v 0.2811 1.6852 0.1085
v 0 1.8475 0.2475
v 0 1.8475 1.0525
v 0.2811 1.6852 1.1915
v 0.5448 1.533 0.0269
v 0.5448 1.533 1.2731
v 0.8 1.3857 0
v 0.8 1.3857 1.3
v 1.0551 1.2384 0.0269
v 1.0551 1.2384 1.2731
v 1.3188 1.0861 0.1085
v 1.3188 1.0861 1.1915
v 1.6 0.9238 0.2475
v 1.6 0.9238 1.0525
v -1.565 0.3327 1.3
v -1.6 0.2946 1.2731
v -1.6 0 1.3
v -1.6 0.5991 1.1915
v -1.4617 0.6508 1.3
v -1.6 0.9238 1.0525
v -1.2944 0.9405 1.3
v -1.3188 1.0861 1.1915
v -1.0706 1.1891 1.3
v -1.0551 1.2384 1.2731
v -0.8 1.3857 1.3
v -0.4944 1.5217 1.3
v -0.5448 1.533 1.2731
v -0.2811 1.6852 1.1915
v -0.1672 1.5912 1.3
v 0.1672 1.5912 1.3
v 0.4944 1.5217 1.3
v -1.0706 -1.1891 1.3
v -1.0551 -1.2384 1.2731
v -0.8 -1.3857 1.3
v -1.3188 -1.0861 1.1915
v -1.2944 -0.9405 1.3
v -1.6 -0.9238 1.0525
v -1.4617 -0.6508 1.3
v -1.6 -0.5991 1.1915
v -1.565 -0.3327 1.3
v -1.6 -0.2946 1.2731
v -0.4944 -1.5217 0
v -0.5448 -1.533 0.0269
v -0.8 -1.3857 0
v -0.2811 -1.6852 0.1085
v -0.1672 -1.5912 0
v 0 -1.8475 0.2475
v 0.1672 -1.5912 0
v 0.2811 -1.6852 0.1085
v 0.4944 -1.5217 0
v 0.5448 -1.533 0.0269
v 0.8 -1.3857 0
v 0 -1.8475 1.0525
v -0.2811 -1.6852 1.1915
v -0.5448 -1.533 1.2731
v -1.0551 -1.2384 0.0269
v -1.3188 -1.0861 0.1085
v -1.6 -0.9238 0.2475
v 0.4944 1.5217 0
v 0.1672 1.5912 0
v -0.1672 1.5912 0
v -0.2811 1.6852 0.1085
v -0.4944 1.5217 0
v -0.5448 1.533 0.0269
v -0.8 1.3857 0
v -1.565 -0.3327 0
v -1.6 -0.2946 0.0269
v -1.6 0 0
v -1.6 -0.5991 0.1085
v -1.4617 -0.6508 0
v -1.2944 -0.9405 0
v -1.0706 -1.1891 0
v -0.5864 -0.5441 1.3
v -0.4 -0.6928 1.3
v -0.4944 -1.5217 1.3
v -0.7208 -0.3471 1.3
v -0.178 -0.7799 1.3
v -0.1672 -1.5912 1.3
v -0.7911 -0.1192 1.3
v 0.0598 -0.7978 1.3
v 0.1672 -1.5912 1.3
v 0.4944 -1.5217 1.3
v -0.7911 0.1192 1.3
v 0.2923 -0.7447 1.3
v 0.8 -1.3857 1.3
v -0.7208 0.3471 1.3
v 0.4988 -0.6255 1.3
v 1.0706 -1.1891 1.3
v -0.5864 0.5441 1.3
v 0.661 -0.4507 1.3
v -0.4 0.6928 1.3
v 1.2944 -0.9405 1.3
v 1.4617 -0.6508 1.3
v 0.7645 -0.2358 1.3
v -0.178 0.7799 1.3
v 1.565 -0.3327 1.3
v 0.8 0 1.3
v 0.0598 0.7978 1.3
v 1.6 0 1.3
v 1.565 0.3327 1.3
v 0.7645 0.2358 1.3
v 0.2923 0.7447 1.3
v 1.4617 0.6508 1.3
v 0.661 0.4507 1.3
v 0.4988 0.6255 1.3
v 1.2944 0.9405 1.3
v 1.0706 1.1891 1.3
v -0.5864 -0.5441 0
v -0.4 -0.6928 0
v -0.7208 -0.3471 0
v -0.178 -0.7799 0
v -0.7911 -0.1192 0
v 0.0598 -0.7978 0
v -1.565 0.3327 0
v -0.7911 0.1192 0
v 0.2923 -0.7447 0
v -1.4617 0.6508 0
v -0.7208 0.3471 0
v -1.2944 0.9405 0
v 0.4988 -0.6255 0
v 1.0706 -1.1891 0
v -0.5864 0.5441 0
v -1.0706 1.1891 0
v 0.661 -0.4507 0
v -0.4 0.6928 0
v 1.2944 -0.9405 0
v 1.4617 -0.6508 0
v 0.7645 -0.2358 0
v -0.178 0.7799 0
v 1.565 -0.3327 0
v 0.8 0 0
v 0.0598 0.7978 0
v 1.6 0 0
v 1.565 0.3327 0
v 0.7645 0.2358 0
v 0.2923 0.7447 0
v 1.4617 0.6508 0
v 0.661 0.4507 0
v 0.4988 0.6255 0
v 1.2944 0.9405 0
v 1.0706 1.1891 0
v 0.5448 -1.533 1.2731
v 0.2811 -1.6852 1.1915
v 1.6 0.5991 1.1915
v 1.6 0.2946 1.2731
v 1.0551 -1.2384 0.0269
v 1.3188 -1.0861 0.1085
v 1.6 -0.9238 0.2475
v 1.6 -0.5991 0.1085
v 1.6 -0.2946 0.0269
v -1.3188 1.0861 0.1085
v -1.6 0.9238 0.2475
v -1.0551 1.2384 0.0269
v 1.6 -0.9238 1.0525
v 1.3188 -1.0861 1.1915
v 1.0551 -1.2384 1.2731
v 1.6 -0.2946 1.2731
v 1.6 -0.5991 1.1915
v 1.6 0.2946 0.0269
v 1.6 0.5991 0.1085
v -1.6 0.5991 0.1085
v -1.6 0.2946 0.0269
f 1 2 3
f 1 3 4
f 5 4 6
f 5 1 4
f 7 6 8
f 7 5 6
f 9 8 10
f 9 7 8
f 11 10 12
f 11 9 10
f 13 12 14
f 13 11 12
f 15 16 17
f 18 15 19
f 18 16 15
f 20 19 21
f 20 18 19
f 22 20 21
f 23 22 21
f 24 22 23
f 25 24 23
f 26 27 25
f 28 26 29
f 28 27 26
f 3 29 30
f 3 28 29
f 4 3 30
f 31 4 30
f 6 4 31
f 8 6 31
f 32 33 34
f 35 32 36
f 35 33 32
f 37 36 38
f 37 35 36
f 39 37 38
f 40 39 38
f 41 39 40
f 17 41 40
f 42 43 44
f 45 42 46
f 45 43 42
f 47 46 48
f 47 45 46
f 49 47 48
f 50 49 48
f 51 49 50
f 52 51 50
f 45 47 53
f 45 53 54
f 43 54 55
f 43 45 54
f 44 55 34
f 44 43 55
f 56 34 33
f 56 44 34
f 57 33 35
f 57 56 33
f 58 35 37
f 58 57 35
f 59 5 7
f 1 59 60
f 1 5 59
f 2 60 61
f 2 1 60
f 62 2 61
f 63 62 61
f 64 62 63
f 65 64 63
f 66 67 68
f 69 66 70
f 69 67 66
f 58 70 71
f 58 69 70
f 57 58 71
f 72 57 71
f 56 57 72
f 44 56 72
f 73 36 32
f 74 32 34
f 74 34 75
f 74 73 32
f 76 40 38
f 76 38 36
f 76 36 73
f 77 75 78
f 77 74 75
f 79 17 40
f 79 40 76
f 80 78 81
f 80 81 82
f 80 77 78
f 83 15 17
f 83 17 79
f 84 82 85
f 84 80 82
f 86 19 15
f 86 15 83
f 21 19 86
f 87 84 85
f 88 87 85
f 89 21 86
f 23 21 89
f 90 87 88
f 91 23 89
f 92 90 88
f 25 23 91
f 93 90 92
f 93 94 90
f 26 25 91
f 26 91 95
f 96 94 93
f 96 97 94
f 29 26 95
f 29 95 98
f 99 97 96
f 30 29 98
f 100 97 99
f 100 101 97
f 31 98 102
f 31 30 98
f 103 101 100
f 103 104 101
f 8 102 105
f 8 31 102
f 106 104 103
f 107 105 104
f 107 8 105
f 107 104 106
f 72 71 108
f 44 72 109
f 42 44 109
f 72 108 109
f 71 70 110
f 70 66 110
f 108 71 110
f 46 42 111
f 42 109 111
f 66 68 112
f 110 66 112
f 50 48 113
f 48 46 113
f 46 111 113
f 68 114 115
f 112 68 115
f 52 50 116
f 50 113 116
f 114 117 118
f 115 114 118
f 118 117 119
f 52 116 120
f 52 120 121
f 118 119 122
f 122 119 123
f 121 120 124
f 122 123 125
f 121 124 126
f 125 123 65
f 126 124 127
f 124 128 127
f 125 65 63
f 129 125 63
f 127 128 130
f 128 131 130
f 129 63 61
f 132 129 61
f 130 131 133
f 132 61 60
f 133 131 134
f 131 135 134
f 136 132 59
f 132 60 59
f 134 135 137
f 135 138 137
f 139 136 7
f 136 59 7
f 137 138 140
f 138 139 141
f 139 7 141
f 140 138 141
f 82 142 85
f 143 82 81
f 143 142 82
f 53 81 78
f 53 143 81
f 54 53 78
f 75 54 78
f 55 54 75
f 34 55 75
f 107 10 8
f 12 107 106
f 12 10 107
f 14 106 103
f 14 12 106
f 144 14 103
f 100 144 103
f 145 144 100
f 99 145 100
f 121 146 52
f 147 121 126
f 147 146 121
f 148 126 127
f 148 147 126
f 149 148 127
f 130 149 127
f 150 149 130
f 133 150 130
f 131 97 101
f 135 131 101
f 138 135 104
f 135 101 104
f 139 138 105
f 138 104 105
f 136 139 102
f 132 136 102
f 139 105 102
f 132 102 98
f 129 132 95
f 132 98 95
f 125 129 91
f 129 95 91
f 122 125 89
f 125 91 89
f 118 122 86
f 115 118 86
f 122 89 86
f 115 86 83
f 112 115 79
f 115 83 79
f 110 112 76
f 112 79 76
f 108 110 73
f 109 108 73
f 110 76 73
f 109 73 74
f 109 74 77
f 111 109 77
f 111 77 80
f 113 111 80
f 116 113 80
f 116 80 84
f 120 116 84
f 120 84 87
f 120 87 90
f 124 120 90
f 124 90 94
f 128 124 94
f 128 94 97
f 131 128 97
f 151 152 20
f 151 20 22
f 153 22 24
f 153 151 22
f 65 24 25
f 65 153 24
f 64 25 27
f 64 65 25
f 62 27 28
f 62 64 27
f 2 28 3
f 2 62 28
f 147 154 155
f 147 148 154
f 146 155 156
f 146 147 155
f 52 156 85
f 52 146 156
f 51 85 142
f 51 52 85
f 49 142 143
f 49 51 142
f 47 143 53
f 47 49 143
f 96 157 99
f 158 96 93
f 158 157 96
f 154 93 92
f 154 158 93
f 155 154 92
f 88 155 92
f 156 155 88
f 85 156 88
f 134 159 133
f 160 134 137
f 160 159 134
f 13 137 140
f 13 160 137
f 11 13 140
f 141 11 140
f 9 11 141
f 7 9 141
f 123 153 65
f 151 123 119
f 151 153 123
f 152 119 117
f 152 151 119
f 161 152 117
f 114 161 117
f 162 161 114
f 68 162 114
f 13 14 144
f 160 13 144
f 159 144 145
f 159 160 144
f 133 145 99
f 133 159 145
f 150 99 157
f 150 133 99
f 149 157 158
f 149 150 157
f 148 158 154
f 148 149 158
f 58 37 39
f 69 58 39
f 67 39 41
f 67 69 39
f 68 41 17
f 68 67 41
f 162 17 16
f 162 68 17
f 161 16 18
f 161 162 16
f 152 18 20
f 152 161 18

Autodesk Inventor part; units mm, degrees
ref_plane "YZ Plane" through (0, 0, 0) normal (1, 0, 0) x (0, 1, 0)
ref_plane "XZ Plane" through (0, 0, 0) normal (0, 1, 0) x (-1, 0, 0)
ref_plane "XY Plane" through (0, 0, 0) normal (0, 0, 1) x (1, 0, 0)
sketch "Sketch1" plane through (0, 0, 0) normal (0, 0, 1) x (1, 0, 0)
  line L0 (0, 1.8475) -> (1.6, 0.9238)
  line L1 (1.6, 0.9238) -> (1.6, -0.9238)
  line L2 (1.6, -0.9238) -> (0, -1.8475)
  line L3 (0, -1.8475) -> (-1.6, -0.9238)
  line L4 (-1.6, -0.9238) -> (-1.6, 0.9238)
  line L5 (-1.6, 0.9238) -> (0, 1.8475)
  point P0 (0, 0)
  point P1 (0, 0)
  dimension "d0" = 3.2
extrude "Main Body" add sketch "Sketch1" along normal blind 1.3
sketch "Sketch2" plane through (0, 0, 1.3) normal (0, 0, 1) x (1, 0, 0)
  circle A0 centre (0, 0) radius 1.6
  dimension "d3" = 3.2
extrude "Front Taper" cut sketch "Sketch2" against normal up to surface (1.3 mm away) draft 45 keep common part
sketch "Sketch3" plane through (0, 0, 0) normal (0, 0, -1) x (-1, 0, 0)
  circle A0 centre (0, 0) radius 1.6
  dimension "d6" = 3.2
extrude "Back Taper" cut sketch "Sketch3" against normal up to surface (1.3 mm away) draft 45 keep common part
sketch "Sketch4" plane through (0, 0, 1.3) normal (0, 0, 1) x (1, 0, 0)
  circle A0 centre (0, 0) radius 0.8
  dimension "d9" = 1.6
extrude "Center Hole" cut sketch "Sketch4" against normal up to surface (1.3 mm away)
thread "Thread1" size "M1.6x0.35" class "6H" standard "ANSI Metric M Profile" full length
sketch "Sketch5" plane through (0, 0, 0) normal (1, 0, 0) x (0, 1, 0)
  line L0 (-1.0281, 1.9183) -> (-0.8, 2.05)
  line L1 (-0.8, 2.05) -> (-0.8, 1.7)
  line L2 (-0.8, 1.7) -> (-1.0281, 1.8317)
  line L3 (-1.1031, 1.875) -> (-0.8, 1.875) construction
  line L4 (-0.8, 1.3) -> (0.8, 1.3) construction
  arc A0 (-1.0281, 1.9183) -> (-1.0281, 1.8317) centre (-1.0031, 1.875) ccw
  point P0 (0, 0)
  point P1 (-0.901, 1.875)
  dimension "d14" = 0.35
  dimension "d15" = 0.4
  dimension "d16" = 0
  dimension "d17" = 0.05
coil "Coil1" [suppressed]
equation "\"d0\" = size"
equation "\"d1\" = thickness"
equation "\"d3\" = d0"
equation "\"d6\" = d0"
equation "\"d9\" = nominalDiameter"
equation "\"d14\" = threadPitch"
equation "\"d15\" = 1.14286 * threadPitch"
equation "\"d17\" = 0.142857 * threadPitch"
equation "\"d18\" = threadPitch"
equation "\"d19\" = 1.57143 * thickness"
equation "\"size\" = 3.2"
equation "\"thickness\" = 1.3"
equation "\"nominalDiameter\" = 1.6"
equation "\"threadPitch\" = 0.35"
properties part number "M1.6" material "Steel, Galvanized"
